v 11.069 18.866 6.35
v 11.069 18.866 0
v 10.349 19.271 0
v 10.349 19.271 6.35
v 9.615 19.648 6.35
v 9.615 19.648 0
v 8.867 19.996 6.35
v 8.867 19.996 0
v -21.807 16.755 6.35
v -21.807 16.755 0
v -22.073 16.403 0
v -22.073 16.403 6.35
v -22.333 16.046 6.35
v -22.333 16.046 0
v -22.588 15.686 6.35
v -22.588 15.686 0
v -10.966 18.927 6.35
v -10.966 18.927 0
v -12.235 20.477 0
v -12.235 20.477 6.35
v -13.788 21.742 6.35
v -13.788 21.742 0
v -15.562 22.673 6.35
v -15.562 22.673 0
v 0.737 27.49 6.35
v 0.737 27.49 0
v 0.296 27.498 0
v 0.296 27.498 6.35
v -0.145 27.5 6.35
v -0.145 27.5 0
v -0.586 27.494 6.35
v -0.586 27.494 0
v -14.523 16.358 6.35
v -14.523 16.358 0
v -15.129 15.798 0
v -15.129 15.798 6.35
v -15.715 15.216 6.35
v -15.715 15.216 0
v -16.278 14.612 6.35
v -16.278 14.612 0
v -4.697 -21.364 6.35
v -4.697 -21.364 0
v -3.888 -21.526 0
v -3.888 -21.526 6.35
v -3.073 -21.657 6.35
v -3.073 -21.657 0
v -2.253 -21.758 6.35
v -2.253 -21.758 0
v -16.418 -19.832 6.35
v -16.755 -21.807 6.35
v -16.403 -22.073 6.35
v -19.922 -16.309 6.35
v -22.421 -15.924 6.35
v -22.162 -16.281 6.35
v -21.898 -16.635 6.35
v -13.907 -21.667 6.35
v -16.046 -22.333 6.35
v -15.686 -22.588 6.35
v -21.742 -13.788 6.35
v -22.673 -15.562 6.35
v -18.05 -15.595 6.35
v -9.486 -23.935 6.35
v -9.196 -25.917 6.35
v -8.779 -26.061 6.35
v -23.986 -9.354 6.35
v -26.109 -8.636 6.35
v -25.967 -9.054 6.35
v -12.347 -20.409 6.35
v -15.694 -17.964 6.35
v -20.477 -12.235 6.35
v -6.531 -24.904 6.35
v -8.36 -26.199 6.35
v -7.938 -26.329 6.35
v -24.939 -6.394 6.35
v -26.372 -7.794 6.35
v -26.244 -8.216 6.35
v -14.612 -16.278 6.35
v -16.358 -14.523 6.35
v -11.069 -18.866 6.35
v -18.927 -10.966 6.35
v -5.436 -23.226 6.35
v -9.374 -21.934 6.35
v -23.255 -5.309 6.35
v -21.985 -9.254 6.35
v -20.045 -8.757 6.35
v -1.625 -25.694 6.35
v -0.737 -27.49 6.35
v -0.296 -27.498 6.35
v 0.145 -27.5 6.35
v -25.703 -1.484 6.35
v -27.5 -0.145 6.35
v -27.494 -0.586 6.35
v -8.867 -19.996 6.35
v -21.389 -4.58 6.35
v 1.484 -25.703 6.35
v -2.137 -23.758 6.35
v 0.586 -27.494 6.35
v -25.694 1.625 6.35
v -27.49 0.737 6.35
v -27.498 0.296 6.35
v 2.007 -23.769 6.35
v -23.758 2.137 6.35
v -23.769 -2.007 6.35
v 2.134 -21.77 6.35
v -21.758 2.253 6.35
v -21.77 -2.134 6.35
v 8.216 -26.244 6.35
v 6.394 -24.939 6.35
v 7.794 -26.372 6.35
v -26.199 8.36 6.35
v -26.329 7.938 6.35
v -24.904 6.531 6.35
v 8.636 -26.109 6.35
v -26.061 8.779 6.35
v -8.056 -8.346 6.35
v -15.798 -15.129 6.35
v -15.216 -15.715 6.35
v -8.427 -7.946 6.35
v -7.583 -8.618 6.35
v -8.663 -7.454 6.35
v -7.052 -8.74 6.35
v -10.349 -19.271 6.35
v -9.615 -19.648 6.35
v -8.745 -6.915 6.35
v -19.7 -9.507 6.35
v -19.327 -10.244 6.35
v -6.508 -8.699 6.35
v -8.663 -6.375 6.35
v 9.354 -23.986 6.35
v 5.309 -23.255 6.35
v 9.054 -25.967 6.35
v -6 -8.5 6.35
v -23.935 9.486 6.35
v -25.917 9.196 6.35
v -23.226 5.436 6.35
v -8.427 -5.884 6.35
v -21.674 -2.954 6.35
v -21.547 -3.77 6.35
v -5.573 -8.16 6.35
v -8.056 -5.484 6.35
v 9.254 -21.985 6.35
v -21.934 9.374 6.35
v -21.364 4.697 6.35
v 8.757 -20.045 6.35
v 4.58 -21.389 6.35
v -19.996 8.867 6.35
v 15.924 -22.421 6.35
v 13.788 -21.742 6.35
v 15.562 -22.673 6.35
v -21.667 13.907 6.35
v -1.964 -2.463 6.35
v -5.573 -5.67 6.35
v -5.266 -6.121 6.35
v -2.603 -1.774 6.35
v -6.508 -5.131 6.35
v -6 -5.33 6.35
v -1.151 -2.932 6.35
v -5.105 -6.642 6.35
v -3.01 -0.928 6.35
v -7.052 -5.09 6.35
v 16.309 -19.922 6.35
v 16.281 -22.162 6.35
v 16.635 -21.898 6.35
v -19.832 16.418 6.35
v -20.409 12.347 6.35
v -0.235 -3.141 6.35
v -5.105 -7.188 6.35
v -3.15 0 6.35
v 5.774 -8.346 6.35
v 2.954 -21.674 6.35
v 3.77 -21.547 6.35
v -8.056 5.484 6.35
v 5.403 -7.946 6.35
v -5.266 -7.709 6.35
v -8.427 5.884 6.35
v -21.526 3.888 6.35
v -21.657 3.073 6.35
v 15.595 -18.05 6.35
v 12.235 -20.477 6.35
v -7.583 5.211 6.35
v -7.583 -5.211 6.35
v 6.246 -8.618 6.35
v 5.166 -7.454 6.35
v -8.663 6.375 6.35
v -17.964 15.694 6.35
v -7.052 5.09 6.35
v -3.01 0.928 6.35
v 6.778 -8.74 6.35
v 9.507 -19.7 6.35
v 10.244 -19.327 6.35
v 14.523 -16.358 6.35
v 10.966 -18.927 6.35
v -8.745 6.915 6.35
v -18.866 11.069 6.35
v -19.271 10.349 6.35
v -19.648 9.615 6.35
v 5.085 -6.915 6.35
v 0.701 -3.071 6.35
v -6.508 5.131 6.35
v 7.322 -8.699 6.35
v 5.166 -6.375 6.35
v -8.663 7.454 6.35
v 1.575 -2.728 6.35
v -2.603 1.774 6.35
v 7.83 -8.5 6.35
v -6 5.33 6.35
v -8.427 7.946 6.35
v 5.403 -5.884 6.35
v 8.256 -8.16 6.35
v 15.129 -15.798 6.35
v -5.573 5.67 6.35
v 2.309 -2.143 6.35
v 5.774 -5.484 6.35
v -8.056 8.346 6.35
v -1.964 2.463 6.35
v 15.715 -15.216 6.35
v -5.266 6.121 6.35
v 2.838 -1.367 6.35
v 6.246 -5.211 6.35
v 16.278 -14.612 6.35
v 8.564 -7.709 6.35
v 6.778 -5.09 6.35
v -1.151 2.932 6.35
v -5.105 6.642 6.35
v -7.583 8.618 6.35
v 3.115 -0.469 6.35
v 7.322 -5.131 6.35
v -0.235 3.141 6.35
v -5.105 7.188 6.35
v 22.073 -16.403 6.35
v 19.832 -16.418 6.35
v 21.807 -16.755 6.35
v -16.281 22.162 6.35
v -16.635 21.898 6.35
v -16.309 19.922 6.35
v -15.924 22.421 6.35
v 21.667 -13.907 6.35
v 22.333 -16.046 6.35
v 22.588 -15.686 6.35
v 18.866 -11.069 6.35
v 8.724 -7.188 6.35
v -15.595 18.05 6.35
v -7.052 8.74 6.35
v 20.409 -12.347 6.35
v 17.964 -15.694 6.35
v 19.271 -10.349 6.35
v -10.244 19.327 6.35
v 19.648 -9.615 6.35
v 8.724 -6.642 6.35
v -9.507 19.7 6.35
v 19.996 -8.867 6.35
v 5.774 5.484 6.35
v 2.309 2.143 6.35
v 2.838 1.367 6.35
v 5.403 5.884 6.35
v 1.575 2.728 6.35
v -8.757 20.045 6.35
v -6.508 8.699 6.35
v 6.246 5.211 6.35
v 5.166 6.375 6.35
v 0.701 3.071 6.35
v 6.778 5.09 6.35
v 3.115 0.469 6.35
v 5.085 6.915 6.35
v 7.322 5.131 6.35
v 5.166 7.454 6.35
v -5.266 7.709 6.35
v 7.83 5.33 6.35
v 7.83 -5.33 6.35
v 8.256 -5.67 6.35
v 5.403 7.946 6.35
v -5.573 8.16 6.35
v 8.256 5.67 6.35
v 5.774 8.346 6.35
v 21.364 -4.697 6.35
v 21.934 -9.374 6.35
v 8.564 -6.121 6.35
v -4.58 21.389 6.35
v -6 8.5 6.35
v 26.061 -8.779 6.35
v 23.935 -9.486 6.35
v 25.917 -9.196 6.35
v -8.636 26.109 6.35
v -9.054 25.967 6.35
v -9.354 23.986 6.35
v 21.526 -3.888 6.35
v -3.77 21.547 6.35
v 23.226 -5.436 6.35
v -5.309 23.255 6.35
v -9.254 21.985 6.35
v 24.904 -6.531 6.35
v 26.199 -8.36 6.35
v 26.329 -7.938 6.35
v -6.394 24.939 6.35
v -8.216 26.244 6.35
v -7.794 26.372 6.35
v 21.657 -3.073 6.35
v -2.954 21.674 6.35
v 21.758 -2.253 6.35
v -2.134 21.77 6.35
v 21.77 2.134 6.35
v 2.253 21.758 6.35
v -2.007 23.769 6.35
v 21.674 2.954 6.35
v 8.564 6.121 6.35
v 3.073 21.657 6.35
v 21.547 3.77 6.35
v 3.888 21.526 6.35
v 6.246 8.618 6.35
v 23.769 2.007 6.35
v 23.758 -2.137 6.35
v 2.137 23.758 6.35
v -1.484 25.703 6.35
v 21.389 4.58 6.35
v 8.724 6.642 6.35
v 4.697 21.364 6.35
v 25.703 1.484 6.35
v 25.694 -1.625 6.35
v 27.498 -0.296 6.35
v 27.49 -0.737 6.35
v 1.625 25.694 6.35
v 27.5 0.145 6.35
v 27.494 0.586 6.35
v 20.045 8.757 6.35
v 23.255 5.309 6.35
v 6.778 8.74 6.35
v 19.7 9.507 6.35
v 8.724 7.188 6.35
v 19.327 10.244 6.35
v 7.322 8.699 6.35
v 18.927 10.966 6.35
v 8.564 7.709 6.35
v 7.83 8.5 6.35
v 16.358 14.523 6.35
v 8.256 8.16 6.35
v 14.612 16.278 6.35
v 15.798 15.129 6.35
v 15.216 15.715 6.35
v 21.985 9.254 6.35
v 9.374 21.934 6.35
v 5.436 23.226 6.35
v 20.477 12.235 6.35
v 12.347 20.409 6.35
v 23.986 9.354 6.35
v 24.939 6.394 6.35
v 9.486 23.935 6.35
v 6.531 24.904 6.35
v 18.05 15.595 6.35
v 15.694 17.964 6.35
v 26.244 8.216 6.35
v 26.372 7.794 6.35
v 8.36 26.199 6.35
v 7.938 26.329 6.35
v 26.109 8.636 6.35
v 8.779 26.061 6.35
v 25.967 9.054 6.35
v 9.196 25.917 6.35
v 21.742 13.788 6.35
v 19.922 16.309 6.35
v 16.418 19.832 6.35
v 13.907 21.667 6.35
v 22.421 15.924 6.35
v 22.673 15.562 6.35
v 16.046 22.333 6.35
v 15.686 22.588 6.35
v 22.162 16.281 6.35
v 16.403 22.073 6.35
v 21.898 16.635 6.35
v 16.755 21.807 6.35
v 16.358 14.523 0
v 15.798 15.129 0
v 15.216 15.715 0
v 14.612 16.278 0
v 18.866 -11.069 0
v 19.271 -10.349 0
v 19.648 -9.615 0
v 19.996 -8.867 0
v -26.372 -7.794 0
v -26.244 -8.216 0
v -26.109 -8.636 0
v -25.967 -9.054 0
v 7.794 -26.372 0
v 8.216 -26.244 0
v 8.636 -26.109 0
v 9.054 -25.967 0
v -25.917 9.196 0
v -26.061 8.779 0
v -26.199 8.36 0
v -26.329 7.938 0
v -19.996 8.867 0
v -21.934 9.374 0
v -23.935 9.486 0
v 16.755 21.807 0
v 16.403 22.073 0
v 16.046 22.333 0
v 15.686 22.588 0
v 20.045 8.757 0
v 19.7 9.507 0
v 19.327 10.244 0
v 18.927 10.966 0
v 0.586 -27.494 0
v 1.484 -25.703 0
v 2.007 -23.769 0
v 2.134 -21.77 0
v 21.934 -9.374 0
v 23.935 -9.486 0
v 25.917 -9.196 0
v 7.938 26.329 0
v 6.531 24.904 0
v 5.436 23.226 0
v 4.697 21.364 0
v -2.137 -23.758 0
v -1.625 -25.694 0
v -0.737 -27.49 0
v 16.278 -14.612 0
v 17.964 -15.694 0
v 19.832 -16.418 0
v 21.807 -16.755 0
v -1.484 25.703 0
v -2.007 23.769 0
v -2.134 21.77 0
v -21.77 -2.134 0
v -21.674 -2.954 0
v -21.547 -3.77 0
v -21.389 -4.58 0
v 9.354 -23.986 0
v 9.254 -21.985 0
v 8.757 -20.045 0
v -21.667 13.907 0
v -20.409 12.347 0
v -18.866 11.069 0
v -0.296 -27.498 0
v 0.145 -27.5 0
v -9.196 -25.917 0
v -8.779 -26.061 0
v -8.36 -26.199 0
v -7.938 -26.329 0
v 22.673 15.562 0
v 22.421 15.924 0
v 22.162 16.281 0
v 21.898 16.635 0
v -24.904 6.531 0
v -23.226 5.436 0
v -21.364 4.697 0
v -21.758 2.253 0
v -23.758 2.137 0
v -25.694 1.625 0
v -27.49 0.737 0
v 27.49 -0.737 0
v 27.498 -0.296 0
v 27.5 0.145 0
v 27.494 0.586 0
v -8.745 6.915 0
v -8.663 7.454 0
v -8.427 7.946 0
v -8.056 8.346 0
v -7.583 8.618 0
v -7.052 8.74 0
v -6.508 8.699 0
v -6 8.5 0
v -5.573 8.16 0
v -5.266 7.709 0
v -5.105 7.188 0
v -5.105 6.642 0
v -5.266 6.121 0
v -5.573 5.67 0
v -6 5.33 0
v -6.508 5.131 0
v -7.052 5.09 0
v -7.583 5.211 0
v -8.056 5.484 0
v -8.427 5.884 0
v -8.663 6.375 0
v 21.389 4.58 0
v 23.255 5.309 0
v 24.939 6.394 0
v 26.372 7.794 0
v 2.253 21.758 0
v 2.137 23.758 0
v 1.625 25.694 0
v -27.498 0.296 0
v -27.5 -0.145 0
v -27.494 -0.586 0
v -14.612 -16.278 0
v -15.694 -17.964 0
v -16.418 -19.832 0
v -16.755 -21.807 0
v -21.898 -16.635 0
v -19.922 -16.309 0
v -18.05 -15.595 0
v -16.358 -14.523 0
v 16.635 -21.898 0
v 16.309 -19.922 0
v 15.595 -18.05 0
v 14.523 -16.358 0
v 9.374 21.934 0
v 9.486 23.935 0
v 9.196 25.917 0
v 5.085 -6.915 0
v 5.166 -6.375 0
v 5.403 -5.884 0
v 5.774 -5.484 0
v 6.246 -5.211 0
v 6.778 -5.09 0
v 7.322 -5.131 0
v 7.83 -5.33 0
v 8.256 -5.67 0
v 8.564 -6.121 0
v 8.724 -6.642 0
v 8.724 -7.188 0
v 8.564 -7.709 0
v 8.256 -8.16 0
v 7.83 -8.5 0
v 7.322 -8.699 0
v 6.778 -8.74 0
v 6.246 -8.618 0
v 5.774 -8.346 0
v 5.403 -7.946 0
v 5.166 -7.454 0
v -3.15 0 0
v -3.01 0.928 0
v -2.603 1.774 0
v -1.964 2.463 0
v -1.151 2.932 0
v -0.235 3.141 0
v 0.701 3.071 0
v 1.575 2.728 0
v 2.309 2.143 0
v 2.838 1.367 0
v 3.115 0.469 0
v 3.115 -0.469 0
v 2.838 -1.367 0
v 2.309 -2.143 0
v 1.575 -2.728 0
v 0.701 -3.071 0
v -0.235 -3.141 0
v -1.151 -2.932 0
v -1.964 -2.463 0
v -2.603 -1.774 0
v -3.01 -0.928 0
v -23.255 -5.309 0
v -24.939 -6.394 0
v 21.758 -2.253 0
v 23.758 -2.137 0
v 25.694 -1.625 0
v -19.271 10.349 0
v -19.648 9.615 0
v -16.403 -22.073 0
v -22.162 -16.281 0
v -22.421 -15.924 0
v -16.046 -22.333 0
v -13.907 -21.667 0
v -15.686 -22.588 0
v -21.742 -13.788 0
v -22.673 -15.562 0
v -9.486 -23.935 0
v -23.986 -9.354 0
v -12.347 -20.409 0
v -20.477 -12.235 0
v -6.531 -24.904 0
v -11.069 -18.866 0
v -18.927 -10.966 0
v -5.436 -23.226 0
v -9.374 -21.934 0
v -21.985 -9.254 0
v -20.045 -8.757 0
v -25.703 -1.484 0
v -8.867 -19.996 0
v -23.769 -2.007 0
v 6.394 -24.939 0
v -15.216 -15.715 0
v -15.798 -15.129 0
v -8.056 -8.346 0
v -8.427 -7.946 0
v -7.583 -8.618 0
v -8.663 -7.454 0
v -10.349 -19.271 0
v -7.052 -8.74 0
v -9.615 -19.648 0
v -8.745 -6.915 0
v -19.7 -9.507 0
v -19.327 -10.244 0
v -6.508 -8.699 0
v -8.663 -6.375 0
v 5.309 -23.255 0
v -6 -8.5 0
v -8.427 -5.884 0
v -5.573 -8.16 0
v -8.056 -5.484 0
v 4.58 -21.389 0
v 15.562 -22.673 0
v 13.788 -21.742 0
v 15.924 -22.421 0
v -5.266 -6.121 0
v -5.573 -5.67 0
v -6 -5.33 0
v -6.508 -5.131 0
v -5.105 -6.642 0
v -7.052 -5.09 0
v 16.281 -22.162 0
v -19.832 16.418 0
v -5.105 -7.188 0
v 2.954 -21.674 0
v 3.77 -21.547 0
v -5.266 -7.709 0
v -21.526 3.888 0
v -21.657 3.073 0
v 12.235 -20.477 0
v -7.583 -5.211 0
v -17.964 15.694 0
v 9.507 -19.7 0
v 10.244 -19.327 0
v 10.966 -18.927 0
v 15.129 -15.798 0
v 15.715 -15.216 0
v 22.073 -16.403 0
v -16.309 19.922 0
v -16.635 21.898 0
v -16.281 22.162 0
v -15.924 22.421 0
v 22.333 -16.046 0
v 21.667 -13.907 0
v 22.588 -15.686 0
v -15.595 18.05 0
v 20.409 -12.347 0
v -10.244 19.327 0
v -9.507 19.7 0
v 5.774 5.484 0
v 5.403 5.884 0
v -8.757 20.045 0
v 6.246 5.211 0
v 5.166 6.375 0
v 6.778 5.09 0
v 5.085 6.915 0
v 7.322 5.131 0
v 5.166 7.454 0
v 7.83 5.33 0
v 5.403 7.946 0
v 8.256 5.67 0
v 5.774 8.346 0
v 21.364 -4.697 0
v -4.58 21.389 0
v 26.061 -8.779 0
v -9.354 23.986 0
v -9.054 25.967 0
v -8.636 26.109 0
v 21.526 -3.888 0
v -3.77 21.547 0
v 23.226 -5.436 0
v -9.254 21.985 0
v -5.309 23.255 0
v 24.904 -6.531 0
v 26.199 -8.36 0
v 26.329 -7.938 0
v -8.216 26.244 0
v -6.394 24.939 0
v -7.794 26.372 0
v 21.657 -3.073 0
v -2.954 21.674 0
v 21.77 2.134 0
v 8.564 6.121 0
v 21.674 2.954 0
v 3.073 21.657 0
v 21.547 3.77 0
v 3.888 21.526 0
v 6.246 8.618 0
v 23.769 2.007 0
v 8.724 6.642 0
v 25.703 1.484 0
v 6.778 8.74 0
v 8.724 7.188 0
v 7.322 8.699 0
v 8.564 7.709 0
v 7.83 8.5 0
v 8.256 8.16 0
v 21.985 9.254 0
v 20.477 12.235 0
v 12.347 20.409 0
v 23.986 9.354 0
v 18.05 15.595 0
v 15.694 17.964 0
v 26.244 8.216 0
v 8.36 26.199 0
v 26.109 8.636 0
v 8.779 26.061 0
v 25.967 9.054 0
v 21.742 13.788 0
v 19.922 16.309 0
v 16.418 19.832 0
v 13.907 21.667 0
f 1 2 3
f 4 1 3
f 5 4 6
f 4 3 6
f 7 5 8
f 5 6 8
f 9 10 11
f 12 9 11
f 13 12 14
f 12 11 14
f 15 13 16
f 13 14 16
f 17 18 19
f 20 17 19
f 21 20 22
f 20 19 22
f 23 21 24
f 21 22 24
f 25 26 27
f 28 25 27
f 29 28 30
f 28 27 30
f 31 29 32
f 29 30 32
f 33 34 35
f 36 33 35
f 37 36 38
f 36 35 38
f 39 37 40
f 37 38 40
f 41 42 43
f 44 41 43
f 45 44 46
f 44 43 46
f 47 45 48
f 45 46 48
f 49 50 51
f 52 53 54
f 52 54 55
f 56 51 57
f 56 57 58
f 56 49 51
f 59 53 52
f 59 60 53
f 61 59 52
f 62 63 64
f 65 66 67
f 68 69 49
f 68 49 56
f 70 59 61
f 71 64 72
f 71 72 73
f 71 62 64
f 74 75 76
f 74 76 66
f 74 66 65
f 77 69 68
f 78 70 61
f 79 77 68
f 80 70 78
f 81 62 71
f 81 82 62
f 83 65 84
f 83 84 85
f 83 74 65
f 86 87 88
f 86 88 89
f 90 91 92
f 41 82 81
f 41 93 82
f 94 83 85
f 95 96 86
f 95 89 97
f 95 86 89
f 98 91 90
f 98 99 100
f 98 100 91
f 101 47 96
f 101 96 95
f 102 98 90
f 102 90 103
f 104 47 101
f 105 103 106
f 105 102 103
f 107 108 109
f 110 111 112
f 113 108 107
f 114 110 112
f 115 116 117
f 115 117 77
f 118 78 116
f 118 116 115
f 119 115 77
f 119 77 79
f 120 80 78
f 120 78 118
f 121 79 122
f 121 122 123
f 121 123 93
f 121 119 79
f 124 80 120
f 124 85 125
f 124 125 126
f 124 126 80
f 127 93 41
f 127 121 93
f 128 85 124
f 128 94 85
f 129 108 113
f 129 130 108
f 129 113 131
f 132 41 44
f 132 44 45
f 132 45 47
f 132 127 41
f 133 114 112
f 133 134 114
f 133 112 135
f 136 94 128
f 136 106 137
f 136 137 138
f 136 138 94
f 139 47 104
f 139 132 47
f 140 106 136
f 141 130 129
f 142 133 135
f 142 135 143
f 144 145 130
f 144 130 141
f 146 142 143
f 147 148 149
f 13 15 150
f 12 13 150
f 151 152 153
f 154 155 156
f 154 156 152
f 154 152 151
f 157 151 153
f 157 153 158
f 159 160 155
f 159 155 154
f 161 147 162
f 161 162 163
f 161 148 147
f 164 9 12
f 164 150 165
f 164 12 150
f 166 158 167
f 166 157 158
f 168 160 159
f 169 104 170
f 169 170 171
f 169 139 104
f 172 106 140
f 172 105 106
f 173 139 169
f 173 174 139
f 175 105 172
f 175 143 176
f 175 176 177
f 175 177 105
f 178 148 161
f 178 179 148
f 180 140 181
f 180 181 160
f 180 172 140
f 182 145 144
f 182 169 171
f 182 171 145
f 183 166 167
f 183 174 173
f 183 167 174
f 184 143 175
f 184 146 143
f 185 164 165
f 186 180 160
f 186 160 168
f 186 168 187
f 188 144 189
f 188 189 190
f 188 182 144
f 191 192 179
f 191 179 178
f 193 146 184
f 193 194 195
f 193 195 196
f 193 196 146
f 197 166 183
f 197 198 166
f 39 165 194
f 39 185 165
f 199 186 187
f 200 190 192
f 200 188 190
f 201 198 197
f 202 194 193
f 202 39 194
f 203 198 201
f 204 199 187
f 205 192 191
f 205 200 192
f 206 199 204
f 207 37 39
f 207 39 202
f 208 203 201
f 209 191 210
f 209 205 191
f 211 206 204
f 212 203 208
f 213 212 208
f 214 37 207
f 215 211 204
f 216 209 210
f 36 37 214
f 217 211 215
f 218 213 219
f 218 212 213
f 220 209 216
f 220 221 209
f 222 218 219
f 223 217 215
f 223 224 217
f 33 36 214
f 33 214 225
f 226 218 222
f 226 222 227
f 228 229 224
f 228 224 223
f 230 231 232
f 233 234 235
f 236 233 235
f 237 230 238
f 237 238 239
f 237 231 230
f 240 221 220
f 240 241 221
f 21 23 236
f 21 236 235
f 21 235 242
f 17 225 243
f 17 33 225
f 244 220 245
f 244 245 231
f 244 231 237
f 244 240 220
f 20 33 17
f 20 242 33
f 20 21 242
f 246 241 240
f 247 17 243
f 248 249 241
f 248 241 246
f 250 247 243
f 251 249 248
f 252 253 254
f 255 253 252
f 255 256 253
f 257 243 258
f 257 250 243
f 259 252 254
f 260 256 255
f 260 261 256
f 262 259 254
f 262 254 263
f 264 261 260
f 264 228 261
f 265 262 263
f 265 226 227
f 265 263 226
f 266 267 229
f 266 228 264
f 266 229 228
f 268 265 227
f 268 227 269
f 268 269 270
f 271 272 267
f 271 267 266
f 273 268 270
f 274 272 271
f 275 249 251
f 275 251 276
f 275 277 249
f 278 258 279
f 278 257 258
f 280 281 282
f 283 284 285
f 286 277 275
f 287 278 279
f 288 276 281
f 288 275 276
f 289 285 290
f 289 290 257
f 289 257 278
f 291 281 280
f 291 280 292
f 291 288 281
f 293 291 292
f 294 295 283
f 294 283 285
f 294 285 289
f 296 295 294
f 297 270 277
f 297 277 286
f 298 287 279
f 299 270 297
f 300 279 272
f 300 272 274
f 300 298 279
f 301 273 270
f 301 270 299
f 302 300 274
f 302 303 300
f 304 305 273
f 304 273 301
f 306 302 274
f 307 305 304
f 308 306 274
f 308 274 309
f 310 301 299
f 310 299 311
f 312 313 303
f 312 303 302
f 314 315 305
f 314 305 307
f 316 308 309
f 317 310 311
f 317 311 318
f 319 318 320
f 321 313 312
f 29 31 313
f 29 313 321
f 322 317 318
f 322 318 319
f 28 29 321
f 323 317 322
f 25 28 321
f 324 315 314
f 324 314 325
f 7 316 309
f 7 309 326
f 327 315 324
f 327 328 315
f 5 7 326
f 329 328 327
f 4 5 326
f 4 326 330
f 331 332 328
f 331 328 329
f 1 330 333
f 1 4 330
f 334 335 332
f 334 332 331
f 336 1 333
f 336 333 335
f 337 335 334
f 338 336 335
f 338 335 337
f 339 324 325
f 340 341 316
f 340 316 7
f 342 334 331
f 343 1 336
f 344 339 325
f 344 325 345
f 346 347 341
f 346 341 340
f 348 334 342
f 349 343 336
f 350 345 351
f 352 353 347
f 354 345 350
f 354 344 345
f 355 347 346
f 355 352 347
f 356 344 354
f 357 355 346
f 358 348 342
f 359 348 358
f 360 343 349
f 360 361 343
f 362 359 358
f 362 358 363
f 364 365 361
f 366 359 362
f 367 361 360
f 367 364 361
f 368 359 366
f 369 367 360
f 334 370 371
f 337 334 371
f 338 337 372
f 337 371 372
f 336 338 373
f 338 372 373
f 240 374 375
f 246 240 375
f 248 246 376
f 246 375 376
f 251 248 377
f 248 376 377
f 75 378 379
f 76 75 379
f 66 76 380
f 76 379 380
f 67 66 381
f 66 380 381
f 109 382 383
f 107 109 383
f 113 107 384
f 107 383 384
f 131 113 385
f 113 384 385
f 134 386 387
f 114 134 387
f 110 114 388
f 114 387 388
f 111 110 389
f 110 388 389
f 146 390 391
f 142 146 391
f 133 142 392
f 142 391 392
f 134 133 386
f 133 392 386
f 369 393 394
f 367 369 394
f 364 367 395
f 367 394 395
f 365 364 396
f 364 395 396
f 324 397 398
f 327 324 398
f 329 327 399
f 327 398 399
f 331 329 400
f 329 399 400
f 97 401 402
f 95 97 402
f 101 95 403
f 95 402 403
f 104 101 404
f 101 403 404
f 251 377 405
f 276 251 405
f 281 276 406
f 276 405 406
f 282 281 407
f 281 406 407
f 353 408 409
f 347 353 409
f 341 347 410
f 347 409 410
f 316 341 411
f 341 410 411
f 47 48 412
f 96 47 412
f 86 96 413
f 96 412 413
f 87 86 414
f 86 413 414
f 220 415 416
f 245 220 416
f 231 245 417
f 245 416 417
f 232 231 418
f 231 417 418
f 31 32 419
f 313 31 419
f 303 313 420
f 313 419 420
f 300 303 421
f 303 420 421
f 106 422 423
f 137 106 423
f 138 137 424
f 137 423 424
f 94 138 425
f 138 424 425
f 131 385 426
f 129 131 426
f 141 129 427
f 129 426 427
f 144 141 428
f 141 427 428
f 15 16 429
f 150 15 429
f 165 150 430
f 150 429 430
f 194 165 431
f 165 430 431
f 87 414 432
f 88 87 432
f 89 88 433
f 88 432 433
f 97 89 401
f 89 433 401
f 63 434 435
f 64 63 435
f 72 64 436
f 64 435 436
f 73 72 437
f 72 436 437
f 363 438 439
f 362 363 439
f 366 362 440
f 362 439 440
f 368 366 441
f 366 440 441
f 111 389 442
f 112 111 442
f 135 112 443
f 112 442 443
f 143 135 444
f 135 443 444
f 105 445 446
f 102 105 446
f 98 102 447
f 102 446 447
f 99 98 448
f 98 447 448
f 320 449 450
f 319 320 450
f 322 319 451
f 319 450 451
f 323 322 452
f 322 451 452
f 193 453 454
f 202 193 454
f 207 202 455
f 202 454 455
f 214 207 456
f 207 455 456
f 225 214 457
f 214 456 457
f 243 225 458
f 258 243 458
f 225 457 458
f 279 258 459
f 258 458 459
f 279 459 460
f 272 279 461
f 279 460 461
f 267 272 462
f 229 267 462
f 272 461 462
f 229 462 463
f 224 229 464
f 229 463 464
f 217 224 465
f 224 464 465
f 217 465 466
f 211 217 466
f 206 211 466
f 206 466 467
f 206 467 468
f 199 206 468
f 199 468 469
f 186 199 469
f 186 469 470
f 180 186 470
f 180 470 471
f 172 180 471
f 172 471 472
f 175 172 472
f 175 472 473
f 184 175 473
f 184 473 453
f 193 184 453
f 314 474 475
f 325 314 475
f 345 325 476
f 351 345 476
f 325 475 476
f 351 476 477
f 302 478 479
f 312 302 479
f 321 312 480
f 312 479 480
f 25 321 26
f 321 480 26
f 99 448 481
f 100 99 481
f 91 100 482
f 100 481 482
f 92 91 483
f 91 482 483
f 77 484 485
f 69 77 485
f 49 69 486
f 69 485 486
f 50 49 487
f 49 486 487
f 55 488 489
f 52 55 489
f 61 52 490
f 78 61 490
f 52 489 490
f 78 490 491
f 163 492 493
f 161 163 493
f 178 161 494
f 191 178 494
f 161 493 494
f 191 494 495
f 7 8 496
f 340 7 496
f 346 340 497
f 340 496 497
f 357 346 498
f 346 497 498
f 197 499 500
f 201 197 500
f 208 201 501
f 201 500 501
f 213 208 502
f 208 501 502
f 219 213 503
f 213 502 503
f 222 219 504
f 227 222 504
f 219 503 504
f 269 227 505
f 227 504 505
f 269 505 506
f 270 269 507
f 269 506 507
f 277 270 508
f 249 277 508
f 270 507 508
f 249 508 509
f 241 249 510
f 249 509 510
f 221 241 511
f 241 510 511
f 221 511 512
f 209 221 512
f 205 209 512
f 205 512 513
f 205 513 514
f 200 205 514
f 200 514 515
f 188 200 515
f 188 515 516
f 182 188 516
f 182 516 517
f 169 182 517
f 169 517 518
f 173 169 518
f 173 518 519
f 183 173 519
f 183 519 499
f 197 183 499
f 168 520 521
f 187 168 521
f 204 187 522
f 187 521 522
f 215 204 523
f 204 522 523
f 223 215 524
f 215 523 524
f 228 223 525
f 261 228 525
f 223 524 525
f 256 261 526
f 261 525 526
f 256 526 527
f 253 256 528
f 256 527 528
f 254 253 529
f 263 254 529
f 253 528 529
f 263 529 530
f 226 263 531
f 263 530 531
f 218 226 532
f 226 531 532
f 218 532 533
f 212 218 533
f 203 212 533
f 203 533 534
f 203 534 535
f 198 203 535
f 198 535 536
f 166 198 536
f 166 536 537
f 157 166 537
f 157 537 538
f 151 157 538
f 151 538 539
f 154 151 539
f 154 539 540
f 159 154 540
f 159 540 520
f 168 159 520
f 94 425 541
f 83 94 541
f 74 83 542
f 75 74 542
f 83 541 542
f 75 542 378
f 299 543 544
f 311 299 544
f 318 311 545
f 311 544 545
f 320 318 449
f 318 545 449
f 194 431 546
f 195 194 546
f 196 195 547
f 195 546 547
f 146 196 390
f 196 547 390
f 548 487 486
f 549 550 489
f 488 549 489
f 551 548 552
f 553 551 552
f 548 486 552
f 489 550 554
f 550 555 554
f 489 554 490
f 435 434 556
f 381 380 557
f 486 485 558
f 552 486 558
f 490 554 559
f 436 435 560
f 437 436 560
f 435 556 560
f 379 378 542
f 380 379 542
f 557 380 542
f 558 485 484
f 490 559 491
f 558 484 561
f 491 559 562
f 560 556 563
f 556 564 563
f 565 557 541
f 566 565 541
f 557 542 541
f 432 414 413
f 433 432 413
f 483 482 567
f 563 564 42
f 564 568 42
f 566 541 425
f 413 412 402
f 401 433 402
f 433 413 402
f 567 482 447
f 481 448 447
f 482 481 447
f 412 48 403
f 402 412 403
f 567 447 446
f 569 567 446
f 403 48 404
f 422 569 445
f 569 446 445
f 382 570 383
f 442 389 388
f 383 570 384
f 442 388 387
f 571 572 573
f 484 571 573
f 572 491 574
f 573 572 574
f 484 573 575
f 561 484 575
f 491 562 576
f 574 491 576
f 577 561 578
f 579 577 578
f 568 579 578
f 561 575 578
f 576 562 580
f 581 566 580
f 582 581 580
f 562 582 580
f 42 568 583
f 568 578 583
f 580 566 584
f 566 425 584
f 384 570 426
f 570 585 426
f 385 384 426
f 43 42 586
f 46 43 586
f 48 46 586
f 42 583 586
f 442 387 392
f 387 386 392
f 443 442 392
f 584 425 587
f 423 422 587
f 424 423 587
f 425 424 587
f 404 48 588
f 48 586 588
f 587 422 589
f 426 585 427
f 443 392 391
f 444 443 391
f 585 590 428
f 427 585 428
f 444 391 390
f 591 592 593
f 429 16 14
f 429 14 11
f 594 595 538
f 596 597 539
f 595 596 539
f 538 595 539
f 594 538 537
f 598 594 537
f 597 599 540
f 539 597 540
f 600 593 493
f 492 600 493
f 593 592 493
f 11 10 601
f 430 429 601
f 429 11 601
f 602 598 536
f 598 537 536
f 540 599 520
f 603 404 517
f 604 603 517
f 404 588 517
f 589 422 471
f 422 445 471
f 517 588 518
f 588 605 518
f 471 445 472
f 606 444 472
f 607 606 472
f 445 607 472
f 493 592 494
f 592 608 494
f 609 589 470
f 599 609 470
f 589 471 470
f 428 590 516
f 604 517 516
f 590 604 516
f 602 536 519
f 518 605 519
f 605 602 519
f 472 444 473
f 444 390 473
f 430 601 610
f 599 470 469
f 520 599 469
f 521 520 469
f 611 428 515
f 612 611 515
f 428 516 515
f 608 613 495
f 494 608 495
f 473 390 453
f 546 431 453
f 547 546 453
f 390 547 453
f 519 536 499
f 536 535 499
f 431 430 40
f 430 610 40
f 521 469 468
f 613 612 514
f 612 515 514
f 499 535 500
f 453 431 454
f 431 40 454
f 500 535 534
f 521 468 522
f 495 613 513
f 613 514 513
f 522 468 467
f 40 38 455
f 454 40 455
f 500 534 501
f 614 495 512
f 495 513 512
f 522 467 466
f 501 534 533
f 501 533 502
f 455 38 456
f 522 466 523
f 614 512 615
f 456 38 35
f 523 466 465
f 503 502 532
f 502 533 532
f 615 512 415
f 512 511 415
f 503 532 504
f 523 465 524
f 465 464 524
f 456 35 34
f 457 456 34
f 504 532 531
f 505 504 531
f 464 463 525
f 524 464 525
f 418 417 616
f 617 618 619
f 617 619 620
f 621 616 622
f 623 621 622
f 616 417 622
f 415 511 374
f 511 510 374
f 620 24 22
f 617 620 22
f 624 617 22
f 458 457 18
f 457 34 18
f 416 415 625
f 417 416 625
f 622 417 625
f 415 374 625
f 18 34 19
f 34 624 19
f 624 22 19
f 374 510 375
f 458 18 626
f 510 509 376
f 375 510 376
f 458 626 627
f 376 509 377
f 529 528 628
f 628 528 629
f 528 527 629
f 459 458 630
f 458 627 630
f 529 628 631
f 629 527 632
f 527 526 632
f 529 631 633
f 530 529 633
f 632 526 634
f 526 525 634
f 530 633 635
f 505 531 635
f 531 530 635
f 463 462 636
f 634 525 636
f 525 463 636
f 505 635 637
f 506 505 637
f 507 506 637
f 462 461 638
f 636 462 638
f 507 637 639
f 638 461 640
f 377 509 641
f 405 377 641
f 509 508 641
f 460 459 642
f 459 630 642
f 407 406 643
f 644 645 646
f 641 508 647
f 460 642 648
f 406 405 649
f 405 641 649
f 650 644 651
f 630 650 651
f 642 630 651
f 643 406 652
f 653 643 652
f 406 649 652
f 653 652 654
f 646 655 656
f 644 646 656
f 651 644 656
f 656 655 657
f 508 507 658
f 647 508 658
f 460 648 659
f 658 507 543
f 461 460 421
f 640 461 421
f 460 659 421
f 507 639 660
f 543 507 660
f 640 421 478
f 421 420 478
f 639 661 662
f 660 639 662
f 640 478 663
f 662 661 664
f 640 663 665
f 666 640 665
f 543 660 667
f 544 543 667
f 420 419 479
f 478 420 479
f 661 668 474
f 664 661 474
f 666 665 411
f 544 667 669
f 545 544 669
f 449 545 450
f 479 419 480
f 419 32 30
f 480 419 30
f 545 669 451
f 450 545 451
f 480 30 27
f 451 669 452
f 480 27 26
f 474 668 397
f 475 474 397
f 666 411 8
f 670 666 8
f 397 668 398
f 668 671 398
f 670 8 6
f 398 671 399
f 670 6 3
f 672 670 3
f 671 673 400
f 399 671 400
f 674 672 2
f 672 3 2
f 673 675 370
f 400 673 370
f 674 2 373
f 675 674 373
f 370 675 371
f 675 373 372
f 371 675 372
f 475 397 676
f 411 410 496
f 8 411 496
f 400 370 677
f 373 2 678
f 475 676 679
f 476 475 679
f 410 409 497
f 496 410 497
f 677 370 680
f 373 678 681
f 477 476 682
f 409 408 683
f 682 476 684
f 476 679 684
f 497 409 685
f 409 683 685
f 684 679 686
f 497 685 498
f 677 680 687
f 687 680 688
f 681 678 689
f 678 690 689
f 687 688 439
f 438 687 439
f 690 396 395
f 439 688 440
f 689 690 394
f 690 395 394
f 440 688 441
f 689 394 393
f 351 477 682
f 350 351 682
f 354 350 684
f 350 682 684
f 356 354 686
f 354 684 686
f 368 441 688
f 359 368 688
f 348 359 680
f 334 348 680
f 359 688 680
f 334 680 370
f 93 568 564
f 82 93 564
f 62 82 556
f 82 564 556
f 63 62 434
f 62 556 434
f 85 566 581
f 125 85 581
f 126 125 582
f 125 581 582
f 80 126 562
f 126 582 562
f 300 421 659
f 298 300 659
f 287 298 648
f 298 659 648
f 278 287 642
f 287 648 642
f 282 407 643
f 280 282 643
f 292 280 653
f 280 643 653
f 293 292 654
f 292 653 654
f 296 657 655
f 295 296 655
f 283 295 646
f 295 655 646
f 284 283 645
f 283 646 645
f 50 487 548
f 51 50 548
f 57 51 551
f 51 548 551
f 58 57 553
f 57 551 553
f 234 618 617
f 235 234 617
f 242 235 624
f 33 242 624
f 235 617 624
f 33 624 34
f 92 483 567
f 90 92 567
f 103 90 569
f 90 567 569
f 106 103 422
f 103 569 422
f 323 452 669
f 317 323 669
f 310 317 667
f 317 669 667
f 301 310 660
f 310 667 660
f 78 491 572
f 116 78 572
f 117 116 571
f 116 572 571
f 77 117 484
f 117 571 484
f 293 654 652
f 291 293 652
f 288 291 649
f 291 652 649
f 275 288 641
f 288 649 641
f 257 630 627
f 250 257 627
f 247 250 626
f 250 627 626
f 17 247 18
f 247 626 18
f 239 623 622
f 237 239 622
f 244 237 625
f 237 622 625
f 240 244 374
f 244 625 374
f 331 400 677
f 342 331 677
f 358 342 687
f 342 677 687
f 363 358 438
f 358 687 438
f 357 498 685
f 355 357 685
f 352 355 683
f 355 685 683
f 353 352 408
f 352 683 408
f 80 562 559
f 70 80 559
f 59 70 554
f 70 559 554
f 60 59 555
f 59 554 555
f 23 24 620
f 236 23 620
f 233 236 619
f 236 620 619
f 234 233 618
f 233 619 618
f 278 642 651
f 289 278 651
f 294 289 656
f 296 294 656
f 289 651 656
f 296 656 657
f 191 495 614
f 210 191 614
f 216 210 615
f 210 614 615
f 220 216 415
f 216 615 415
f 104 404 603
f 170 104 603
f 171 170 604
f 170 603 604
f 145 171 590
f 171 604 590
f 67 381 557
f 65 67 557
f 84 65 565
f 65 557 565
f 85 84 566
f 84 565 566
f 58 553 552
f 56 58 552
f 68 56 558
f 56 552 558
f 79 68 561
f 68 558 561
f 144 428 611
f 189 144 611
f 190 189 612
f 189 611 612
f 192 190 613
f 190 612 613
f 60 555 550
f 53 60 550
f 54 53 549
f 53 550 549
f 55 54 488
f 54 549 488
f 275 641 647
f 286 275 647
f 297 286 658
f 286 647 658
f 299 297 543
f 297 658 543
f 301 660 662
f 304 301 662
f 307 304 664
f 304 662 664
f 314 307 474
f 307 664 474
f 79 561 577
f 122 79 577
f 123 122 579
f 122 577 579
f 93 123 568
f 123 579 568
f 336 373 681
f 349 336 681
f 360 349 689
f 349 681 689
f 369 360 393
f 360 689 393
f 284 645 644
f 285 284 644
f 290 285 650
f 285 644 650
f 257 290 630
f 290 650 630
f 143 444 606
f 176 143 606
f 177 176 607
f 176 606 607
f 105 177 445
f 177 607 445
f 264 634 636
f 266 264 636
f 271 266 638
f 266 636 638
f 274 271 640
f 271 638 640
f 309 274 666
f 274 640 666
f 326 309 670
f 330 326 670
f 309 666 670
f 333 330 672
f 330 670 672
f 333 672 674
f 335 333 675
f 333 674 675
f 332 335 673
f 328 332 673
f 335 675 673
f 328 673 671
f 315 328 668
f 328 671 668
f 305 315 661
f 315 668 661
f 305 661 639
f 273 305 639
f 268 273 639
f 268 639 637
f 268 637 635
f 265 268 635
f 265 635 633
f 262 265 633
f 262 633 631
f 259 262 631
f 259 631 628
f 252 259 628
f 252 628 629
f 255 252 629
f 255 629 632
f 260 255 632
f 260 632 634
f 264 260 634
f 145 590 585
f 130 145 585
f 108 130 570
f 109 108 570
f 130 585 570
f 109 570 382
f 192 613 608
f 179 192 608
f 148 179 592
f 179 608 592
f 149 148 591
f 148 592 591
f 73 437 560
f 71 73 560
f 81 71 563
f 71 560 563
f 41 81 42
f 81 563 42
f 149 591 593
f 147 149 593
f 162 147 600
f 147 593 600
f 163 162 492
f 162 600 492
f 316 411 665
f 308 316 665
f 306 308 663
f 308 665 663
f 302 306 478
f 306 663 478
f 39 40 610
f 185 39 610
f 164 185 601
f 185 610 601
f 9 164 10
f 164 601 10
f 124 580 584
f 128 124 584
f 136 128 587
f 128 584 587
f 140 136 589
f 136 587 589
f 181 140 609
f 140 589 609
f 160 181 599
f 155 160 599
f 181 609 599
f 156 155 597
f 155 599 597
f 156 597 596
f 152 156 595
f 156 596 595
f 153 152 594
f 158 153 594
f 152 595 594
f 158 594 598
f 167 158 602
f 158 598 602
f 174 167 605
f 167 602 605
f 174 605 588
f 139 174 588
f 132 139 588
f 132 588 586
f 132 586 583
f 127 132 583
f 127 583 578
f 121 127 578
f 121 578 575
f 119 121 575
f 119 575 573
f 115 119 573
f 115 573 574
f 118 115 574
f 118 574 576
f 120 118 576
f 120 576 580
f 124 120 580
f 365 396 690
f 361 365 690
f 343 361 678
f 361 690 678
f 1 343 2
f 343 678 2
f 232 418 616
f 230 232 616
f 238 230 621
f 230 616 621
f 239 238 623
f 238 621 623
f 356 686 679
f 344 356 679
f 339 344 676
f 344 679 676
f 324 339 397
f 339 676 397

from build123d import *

# Parameters (mm, degrees)
BOSS_EXTRU_1_DEPTH      = 6.35
ENL_V_MAT_EXTRU_1_REACH = 41.406
ESQUISSE2_R             = 3.15
ESQUISSE2_R_2           = 1.83


with BuildPart() as part:
    # Esquisse1 → Boss.-Extru.1 (new body)
    with BuildSketch(Plane.XY):
        with BuildLine():
            ThreePointArc((4.580283008, -21.38908328), (5.809239787, -24.124430095), (7.79392735, -26.37242303))
            ThreePointArc((7.79392735, -26.37242303), (8.426297829, -26.177232568), (9.053788111, -25.96688123))
            ThreePointArc((9.053788111, -25.96688123), (9.354446156, -22.983248931), (8.756985681, -20.044627155))
            ThreePointArc((8.756985681, -20.044627155), (9.877166912, -19.517004119), (10.965698229, -18.926841743))
            ThreePointArc((10.965698229, -18.926841743), (12.979774233, -21.148542625), (15.561992292, -22.673208769))
            ThreePointArc((15.561992292, -22.673208769), (16.103095187, -22.292158383), (16.634871772, -21.898197212))
            ThreePointArc((16.634871772, -21.898197212), (15.998821478, -18.967685826), (14.522518732, -16.357515878))
            ThreePointArc((14.522518732, -16.357515878), (15.424829906, -15.509561514), (16.277714505, -14.611909064))
            ThreePointArc((16.277714505, -14.611909064), (18.879757941, -16.102488453), (21.806741003, -16.75458286))
            ThreePointArc((21.806741003, -16.75458286), (22.203609392, -16.224972418), (22.587618281, -15.685965077))
            ThreePointArc((22.587618281, -15.685965077), (21.077120684, -13.095433477), (18.866486465, -11.069216977))
            ThreePointArc((18.866486465, -11.069216977), (19.462603078, -9.983934966), (19.996354671, -8.86666092))
            ThreePointArc((19.996354671, -8.86666092), (22.9316594, -9.480210518), (25.916893968, -9.195901645))
            ThreePointArc((25.916893968, -9.195901645), (26.130679608, -8.569573106), (26.329331336, -7.93828139))
            ThreePointArc((26.329331336, -7.93828139), (24.092244465, -5.941308858), (21.363671052, -4.697385994))
            ThreePointArc((21.363671052, -4.697385994), (21.595241057, -3.481011302), (21.75761232, -2.253482226))
            ThreePointArc((21.75761232, -2.253482226), (24.738850262, -1.929943525), (27.490120777, -0.737061506))
            ThreePointArc((27.490120777, -0.737061506), (27.499896841, -0.075324271), (27.493745992, 0.586456589))
            ThreePointArc((27.493745992, 0.586456589), (24.749051496, 1.794392467), (21.769630667, 2.134257858))
            ThreePointArc((21.769630667, 2.134257858), (21.613986378, 3.362658002), (21.38908328, 4.580283008))
            ThreePointArc((21.38908328, 4.580283008), (24.124430095, 5.809239787), (26.37242303, 7.79392735))
            ThreePointArc((26.37242303, 7.79392735), (26.177232568, 8.426297829), (25.96688123, 9.053788111))
            ThreePointArc((25.96688123, 9.053788111), (22.983248931, 9.354446156), (20.044627155, 8.756985681))
            ThreePointArc((20.044627155, 8.756985681), (19.517004119, 9.877166912), (18.926841743, 10.965698229))
            ThreePointArc((18.926841743, 10.965698229), (21.148542625, 12.979774233), (22.673208769, 15.561992292))
            ThreePointArc((22.673208769, 15.561992292), (22.292158383, 16.103095187), (21.898197212, 16.634871772))
            ThreePointArc((21.898197212, 16.634871772), (18.967685826, 15.998821478), (16.357515878, 14.522518732))
            ThreePointArc((16.357515878, 14.522518732), (15.509561514, 15.424829906), (14.611909064, 16.277714505))
            ThreePointArc((14.611909064, 16.277714505), (16.102488453, 18.879757941), (16.75458286, 21.806741003))
            ThreePointArc((16.75458286, 21.806741003), (16.224972418, 22.203609392), (15.685965077, 22.587618281))
            ThreePointArc((15.685965077, 22.587618281), (13.095433477, 21.077120684), (11.069216977, 18.866486465))
            ThreePointArc((11.069216977, 18.866486465), (9.983934966, 19.462603078), (8.86666092, 19.996354671))
            ThreePointArc((8.86666092, 19.996354671), (9.480210518, 22.9316594), (9.195901645, 25.916893968))
            ThreePointArc((9.195901645, 25.916893968), (8.569573106, 26.130679608), (7.93828139, 26.329331336))
            ThreePointArc((7.93828139, 26.329331336), (5.941308858, 24.092244465), (4.697385994, 21.363671052))
            ThreePointArc((4.697385994, 21.363671052), (3.481011302, 21.595241057), (2.253482226, 21.75761232))
            ThreePointArc((2.253482226, 21.75761232), (1.929943525, 24.738850262), (0.737061506, 27.490120777))
            ThreePointArc((0.737061506, 27.490120777), (0.075324271, 27.499896841), (-0.586456589, 27.493745992))
            ThreePointArc((-0.586456589, 27.493745992), (-1.794392467, 24.749051496), (-2.134257858, 21.769630667))
            ThreePointArc((-2.134257858, 21.769630667), (-3.362658002, 21.613986378), (-4.580283008, 21.38908328))
            ThreePointArc((-4.580283008, 21.38908328), (-5.809239787, 24.124430095), (-7.79392735, 26.37242303))
            ThreePointArc((-7.79392735, 26.37242303), (-8.426297829, 26.177232568), (-9.053788111, 25.96688123))
            ThreePointArc((-9.053788111, 25.96688123), (-9.354446156, 22.983248931), (-8.756985681, 20.044627155))
            ThreePointArc((-8.756985681, 20.044627155), (-9.877166912, 19.517004119), (-10.965698229, 18.926841743))
            ThreePointArc((-10.965698229, 18.926841743), (-12.979774233, 21.148542625), (-15.561992292, 22.673208769))
            ThreePointArc((-15.561992292, 22.673208769), (-16.103095187, 22.292158383), (-16.634871772, 21.898197212))
            ThreePointArc((-16.634871772, 21.898197212), (-15.998821478, 18.967685826), (-14.522518732, 16.357515878))
            ThreePointArc((-14.522518732, 16.357515878), (-15.424829906, 15.509561514), (-16.277714505, 14.611909064))
            ThreePointArc((-16.277714505, 14.611909064), (-18.879757941, 16.102488453), (-21.806741003, 16.75458286))
            ThreePointArc((-21.806741003, 16.75458286), (-22.203609392, 16.224972418), (-22.587618281, 15.685965077))
            ThreePointArc((-22.587618281, 15.685965077), (-21.077120684, 13.095433477), (-18.866486465, 11.069216977))
            ThreePointArc((-18.866486465, 11.069216977), (-19.462603078, 9.983934966), (-19.996354671, 8.86666092))
            ThreePointArc((-19.996354671, 8.86666092), (-22.9316594, 9.480210518), (-25.916893968, 9.195901645))
            ThreePointArc((-25.916893968, 9.195901645), (-26.130679608, 8.569573106), (-26.329331336, 7.93828139))
            ThreePointArc((-26.329331336, 7.93828139), (-24.092244465, 5.941308858), (-21.363671052, 4.697385994))
            ThreePointArc((-21.363671052, 4.697385994), (-21.595241057, 3.481011302), (-21.75761232, 2.253482226))
            ThreePointArc((-21.75761232, 2.253482226), (-24.738850262, 1.929943525), (-27.490120777, 0.737061506))
            ThreePointArc((-27.490120777, 0.737061506), (-27.499896841, 0.075324271), (-27.493745992, -0.586456589))
            ThreePointArc((-27.493745992, -0.586456589), (-24.749051496, -1.794392467), (-21.769630667, -2.134257858))
            ThreePointArc((-21.769630667, -2.134257858), (-21.613986378, -3.362658002), (-21.38908328, -4.580283008))
            ThreePointArc((-21.38908328, -4.580283008), (-24.124430095, -5.809239787), (-26.37242303, -7.79392735))
            ThreePointArc((-26.37242303, -7.79392735), (-26.177232568, -8.426297829), (-25.96688123, -9.053788111))
            ThreePointArc((-25.96688123, -9.053788111), (-22.983248931, -9.354446156), (-20.044627155, -8.756985681))
            ThreePointArc((-20.044627155, -8.756985681), (-19.517004119, -9.877166912), (-18.926841743, -10.965698229))
            ThreePointArc((-18.926841743, -10.965698229), (-21.148542625, -12.979774233), (-22.673208769, -15.561992292))
            ThreePointArc((-22.673208769, -15.561992292), (-22.292158383, -16.103095187), (-21.898197212, -16.634871772))
            ThreePointArc((-21.898197212, -16.634871772), (-18.967685826, -15.998821478), (-16.357515878, -14.522518732))
            ThreePointArc((-16.357515878, -14.522518732), (-15.509561514, -15.424829906), (-14.611909064, -16.277714505))
            ThreePointArc((-14.611909064, -16.277714505), (-16.102488453, -18.879757941), (-16.75458286, -21.806741003))
            ThreePointArc((-16.75458286, -21.806741003), (-16.224972418, -22.203609392), (-15.685965077, -22.587618281))
            ThreePointArc((-15.685965077, -22.587618281), (-13.095433477, -21.077120684), (-11.069216977, -18.866486465))
            ThreePointArc((-11.069216977, -18.866486465), (-9.983934966, -19.462603078), (-8.86666092, -19.996354671))
            ThreePointArc((-8.86666092, -19.996354671), (-9.480210518, -22.9316594), (-9.195901645, -25.916893968))
            ThreePointArc((-9.195901645, -25.916893968), (-8.569573106, -26.130679608), (-7.93828139, -26.329331336))
            ThreePointArc((-7.93828139, -26.329331336), (-5.941308858, -24.092244465), (-4.697385994, -21.363671052))
            ThreePointArc((-4.697385994, -21.363671052), (-3.481011302, -21.595241057), (-2.253482226, -21.75761232))
            ThreePointArc((-2.253482226, -21.75761232), (-1.929943525, -24.738850262), (-0.737061506, -27.490120777))
            ThreePointArc((-0.737061506, -27.490120777), (-0.075324271, -27.499896841), (0.586456589, -27.493745992))
            ThreePointArc((0.586456589, -27.493745992), (1.794392467, -24.749051496), (2.134257858, -21.769630667))
            ThreePointArc((2.134257858, -21.769630667), (3.362658002, -21.613986378), (4.580283008, -21.38908328))
        make_face()
    extrude(amount=BOSS_EXTRU_1_DEPTH)

    # Esquisse2 → Enlèv. mat.-Extru.1 (cut, up to next)
    with BuildSketch(Plane(origin=(0, 0, 0), x_dir=(-1, 0, 0), z_dir=(0, 0, -1)), mode=Mode.PRIVATE) as enl_v_mat_extru_1_sk1:
        Circle(ESQUISSE2_R)
    enl_v_mat_extru_1_tool1 = extrude(enl_v_mat_extru_1_sk1.sketch, amount=-ENL_V_MAT_EXTRU_1_REACH, mode=Mode.PRIVATE) & part.part
    # Esquisse2 → Enlèv. mat.-Extru.1 (cut, up to next)
    with BuildSketch(Plane(origin=(0, 0, 0), x_dir=(-1, 0, 0), z_dir=(0, 0, -1)), mode=Mode.PRIVATE) as enl_v_mat_extru_1_sk2:
        with Locations((-6.914797213, -6.914797213)):
            Circle(ESQUISSE2_R_2)
    enl_v_mat_extru_1_tool2 = extrude(enl_v_mat_extru_1_sk2.sketch, amount=-ENL_V_MAT_EXTRU_1_REACH, mode=Mode.PRIVATE) & part.part
    # Esquisse2 → Enlèv. mat.-Extru.1 (cut, up to next)
    with BuildSketch(Plane(origin=(0, 0, 0), x_dir=(-1, 0, 0), z_dir=(0, 0, -1)), mode=Mode.PRIVATE) as enl_v_mat_extru_1_sk3:
        with Locations((-6.914797213, 6.914797213)):
            Circle(ESQUISSE2_R_2)
    enl_v_mat_extru_1_tool3 = extrude(enl_v_mat_extru_1_sk3.sketch, amount=-ENL_V_MAT_EXTRU_1_REACH, mode=Mode.PRIVATE) & part.part
    # Esquisse2 → Enlèv. mat.-Extru.1 (cut, up to next)
    with BuildSketch(Plane(origin=(0, 0, 0), x_dir=(-1, 0, 0), z_dir=(0, 0, -1)), mode=Mode.PRIVATE) as enl_v_mat_extru_1_sk4:
        with Locations((6.914797213, 6.914797213)):
            Circle(ESQUISSE2_R_2)
    enl_v_mat_extru_1_tool4 = extrude(enl_v_mat_extru_1_sk4.sketch, amount=-ENL_V_MAT_EXTRU_1_REACH, mode=Mode.PRIVATE) & part.part
    # Esquisse2 → Enlèv. mat.-Extru.1 (cut, up to next)
    with BuildSketch(Plane(origin=(0, 0, 0), x_dir=(-1, 0, 0), z_dir=(0, 0, -1)), mode=Mode.PRIVATE) as enl_v_mat_extru_1_sk5:
        with Locations((6.914797213, -6.914797213)):
            Circle(ESQUISSE2_R_2)
    enl_v_mat_extru_1_tool5 = extrude(enl_v_mat_extru_1_sk5.sketch, amount=-ENL_V_MAT_EXTRU_1_REACH, mode=Mode.PRIVATE) & part.part
    add(enl_v_mat_extru_1_tool1.solids().sort_by_distance((0, 0, 0))[0], mode=Mode.SUBTRACT)
    add(enl_v_mat_extru_1_tool2.solids().sort_by_distance((6.914797, -6.914797, 0))[0], mode=Mode.SUBTRACT)
    add(enl_v_mat_extru_1_tool3.solids().sort_by_distance((6.914797, 6.914797, 0))[0], mode=Mode.SUBTRACT)
    add(enl_v_mat_extru_1_tool4.solids().sort_by_distance((-6.914797, 6.914797, 0))[0], mode=Mode.SUBTRACT)
    add(enl_v_mat_extru_1_tool5.solids().sort_by_distance((-6.914797, -6.914797, 0))[0], mode=Mode.SUBTRACT)


solid = part.part
